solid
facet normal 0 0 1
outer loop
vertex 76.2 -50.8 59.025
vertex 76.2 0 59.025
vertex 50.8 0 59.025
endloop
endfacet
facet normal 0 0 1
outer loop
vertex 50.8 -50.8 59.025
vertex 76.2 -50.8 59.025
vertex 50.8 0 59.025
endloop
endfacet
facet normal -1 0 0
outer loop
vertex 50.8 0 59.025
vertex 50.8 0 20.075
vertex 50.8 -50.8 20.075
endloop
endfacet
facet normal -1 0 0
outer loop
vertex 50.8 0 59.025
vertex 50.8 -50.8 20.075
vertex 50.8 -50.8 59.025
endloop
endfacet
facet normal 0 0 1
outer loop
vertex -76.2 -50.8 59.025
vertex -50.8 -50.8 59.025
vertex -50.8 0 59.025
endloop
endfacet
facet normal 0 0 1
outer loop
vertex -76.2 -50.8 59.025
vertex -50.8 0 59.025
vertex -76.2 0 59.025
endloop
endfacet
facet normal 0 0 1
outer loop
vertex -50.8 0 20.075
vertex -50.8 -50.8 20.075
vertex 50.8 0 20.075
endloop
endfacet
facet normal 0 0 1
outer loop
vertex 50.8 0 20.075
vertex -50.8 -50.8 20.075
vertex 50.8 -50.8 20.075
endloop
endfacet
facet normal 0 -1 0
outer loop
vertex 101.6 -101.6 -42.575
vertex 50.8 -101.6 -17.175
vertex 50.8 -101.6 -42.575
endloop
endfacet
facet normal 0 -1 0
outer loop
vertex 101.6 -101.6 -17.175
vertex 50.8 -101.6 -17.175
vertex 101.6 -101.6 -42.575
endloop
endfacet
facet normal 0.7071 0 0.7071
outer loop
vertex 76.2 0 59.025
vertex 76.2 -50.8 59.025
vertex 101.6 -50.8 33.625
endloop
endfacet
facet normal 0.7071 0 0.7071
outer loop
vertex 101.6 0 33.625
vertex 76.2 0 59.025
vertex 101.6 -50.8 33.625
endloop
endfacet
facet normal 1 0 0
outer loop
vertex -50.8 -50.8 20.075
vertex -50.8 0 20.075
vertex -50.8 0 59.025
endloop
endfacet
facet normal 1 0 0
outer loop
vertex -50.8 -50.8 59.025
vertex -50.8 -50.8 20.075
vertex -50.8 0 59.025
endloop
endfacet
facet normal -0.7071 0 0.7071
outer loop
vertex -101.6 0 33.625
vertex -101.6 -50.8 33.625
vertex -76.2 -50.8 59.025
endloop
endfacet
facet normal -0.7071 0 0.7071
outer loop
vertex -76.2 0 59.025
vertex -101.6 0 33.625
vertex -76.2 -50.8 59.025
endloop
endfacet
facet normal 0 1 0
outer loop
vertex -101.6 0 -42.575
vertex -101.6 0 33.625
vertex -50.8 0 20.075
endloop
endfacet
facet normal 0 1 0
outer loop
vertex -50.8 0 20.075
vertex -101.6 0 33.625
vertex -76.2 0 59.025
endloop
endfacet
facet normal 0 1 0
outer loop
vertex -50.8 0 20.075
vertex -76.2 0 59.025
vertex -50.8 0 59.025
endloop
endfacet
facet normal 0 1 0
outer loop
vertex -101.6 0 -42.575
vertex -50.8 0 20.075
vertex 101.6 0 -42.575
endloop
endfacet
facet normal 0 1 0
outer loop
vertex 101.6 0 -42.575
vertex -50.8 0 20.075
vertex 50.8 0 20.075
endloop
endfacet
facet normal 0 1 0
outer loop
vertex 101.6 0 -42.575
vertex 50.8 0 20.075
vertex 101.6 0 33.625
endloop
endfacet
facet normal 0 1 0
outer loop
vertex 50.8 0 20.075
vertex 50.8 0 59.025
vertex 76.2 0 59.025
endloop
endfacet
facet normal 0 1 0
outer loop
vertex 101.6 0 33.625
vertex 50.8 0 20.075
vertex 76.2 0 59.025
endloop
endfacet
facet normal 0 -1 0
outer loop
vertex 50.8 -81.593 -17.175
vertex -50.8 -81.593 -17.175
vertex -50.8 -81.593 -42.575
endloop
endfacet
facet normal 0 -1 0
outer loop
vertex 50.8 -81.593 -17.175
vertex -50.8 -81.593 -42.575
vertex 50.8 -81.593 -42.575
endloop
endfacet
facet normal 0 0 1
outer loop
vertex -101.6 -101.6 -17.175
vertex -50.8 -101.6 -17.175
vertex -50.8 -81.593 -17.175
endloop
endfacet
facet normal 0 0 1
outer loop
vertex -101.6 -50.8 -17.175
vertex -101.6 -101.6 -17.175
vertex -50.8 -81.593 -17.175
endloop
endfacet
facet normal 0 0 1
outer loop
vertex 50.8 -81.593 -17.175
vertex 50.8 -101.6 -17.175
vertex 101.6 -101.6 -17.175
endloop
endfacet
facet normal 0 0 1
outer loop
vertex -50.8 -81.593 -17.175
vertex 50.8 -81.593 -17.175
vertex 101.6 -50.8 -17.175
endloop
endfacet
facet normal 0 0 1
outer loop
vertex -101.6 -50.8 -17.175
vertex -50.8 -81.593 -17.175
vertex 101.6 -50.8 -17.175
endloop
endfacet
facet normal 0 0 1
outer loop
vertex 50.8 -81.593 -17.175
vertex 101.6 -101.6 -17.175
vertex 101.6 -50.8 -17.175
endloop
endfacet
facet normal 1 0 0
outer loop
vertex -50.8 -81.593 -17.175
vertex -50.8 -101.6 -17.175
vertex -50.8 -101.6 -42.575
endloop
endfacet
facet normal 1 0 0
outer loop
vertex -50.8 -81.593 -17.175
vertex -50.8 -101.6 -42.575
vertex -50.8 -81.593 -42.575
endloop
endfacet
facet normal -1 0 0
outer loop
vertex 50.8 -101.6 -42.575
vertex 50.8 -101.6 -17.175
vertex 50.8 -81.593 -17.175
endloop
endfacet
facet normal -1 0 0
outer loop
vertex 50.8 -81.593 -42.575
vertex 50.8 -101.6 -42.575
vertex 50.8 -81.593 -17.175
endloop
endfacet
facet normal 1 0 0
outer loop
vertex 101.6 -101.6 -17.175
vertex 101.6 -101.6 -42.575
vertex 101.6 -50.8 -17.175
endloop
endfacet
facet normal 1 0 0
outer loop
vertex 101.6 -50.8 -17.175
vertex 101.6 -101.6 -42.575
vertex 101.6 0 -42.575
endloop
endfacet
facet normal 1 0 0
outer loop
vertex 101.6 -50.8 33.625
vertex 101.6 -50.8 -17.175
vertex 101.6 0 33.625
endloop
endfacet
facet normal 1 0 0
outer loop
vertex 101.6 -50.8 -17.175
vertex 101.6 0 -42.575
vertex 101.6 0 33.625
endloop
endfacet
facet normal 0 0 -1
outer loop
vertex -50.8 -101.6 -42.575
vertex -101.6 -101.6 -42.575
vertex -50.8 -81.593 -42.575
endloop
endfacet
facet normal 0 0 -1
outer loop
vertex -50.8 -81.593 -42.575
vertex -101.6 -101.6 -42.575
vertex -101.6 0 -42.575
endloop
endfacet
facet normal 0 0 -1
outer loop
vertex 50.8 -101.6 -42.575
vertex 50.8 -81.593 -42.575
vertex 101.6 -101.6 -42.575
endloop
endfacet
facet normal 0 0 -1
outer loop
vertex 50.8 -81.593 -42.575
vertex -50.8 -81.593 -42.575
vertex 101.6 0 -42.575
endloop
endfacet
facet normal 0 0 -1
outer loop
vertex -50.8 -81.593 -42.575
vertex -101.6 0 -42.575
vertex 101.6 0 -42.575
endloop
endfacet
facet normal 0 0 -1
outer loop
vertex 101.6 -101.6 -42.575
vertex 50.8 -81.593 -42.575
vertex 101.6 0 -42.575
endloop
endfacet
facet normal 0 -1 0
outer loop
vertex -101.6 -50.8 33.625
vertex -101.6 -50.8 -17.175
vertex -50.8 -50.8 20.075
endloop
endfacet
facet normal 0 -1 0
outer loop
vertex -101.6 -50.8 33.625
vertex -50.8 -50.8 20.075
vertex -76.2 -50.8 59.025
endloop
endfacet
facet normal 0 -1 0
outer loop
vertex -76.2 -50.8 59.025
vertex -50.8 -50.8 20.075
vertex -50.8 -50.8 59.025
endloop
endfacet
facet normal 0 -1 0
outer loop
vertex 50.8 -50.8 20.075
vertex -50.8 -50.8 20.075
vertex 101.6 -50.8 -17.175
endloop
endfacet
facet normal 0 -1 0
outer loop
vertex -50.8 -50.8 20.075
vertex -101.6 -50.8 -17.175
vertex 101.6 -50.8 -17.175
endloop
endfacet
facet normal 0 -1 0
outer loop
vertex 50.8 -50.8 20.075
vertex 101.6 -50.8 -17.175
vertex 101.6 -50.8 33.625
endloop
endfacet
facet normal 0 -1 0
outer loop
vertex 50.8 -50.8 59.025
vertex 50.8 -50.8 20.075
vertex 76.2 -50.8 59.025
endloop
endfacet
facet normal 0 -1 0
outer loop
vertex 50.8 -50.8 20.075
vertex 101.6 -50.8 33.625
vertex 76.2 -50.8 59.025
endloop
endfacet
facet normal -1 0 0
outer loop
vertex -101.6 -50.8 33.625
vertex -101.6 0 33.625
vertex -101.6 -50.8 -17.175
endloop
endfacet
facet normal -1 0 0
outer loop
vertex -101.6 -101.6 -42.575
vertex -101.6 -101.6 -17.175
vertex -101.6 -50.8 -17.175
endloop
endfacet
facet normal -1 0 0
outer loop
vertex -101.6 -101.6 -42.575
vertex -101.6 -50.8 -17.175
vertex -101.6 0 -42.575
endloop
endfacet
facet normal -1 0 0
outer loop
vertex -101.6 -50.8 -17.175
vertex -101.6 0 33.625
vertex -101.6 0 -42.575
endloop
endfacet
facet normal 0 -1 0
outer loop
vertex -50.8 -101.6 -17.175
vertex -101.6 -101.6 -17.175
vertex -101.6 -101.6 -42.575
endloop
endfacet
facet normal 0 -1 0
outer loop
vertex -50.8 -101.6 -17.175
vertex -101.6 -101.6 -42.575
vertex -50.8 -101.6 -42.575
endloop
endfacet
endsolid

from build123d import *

# Parameters (mm, degrees)
F0_W      = 101.6
F0_H      = 42.112397
F1_DEPTH  = 101.6
F2_W      = 50.8
F2_H      = 76.2
F3_DEPTH  = 203.2
F4_W      = 101.6
F4_H      = 20.007362
F5_DEPTH  = 25.4
F6_W      = 101.6
F6_H      = 38.950141
F7_DEPTH  = 50.8
F9_DEPTH  = 101.6
F11_DEPTH = 101.6


with BuildPart() as f1:
    # F0 (on Front) → F1 (new body)
    with BuildSketch(Plane.XZ):
        Polygon((-50.799996, 59.025088), (-101.599996, 59.025088), (-101.599996, -42.574912), (101.600004, -42.574912), (101.600004, 59.025088), (50.800004, 59.025088), (50.800004, 16.912691), (-50.799996, 16.912691), align=None)
        with Locations((4e-06, 37.968889)):
            Rectangle(F0_W, F0_H)
    extrude(amount=F1_DEPTH)

    # F2 (on face) → F3 (cut)
    with BuildSketch(Plane.YZ.offset(101.600004)):
        with Locations((-76.2, 20.925088)):
            Rectangle(F2_W, F2_H)
    extrude(amount=-F3_DEPTH, mode=Mode.SUBTRACT)

    # F4 (on face) → F5 (cut)
    with BuildSketch(Plane.XY.offset(-17.174912)):
        with Locations((4e-06, -91.596319)):
            Rectangle(F4_W, F4_H)
    extrude(amount=-F5_DEPTH, mode=Mode.SUBTRACT)

    # F6 (on face) → F7 (cut)
    with BuildSketch(Plane.XZ.offset(50.8)):
        with Locations((4e-06, 39.550017)):
            Rectangle(F6_W, F6_H)
    extrude(amount=-F7_DEPTH, mode=Mode.SUBTRACT)

    # F8 (on face) → F9 (cut)
    with BuildSketch(Plane.XZ.offset(50.8)):
        Polygon((-76.199996, 59.025088), (-101.599996, 59.025088), (-101.599996, 33.625088), align=None)
    extrude(amount=-F9_DEPTH, mode=Mode.SUBTRACT)

    # F10 (on face) → F11 (cut)
    with BuildSketch(Plane.XZ.offset(50.8)):
        Polygon((76.200004, 59.025088), (101.600004, 33.625088), (101.600004, 59.025088), align=None)
    extrude(amount=-F11_DEPTH, mode=Mode.SUBTRACT)


solid = f1.part
